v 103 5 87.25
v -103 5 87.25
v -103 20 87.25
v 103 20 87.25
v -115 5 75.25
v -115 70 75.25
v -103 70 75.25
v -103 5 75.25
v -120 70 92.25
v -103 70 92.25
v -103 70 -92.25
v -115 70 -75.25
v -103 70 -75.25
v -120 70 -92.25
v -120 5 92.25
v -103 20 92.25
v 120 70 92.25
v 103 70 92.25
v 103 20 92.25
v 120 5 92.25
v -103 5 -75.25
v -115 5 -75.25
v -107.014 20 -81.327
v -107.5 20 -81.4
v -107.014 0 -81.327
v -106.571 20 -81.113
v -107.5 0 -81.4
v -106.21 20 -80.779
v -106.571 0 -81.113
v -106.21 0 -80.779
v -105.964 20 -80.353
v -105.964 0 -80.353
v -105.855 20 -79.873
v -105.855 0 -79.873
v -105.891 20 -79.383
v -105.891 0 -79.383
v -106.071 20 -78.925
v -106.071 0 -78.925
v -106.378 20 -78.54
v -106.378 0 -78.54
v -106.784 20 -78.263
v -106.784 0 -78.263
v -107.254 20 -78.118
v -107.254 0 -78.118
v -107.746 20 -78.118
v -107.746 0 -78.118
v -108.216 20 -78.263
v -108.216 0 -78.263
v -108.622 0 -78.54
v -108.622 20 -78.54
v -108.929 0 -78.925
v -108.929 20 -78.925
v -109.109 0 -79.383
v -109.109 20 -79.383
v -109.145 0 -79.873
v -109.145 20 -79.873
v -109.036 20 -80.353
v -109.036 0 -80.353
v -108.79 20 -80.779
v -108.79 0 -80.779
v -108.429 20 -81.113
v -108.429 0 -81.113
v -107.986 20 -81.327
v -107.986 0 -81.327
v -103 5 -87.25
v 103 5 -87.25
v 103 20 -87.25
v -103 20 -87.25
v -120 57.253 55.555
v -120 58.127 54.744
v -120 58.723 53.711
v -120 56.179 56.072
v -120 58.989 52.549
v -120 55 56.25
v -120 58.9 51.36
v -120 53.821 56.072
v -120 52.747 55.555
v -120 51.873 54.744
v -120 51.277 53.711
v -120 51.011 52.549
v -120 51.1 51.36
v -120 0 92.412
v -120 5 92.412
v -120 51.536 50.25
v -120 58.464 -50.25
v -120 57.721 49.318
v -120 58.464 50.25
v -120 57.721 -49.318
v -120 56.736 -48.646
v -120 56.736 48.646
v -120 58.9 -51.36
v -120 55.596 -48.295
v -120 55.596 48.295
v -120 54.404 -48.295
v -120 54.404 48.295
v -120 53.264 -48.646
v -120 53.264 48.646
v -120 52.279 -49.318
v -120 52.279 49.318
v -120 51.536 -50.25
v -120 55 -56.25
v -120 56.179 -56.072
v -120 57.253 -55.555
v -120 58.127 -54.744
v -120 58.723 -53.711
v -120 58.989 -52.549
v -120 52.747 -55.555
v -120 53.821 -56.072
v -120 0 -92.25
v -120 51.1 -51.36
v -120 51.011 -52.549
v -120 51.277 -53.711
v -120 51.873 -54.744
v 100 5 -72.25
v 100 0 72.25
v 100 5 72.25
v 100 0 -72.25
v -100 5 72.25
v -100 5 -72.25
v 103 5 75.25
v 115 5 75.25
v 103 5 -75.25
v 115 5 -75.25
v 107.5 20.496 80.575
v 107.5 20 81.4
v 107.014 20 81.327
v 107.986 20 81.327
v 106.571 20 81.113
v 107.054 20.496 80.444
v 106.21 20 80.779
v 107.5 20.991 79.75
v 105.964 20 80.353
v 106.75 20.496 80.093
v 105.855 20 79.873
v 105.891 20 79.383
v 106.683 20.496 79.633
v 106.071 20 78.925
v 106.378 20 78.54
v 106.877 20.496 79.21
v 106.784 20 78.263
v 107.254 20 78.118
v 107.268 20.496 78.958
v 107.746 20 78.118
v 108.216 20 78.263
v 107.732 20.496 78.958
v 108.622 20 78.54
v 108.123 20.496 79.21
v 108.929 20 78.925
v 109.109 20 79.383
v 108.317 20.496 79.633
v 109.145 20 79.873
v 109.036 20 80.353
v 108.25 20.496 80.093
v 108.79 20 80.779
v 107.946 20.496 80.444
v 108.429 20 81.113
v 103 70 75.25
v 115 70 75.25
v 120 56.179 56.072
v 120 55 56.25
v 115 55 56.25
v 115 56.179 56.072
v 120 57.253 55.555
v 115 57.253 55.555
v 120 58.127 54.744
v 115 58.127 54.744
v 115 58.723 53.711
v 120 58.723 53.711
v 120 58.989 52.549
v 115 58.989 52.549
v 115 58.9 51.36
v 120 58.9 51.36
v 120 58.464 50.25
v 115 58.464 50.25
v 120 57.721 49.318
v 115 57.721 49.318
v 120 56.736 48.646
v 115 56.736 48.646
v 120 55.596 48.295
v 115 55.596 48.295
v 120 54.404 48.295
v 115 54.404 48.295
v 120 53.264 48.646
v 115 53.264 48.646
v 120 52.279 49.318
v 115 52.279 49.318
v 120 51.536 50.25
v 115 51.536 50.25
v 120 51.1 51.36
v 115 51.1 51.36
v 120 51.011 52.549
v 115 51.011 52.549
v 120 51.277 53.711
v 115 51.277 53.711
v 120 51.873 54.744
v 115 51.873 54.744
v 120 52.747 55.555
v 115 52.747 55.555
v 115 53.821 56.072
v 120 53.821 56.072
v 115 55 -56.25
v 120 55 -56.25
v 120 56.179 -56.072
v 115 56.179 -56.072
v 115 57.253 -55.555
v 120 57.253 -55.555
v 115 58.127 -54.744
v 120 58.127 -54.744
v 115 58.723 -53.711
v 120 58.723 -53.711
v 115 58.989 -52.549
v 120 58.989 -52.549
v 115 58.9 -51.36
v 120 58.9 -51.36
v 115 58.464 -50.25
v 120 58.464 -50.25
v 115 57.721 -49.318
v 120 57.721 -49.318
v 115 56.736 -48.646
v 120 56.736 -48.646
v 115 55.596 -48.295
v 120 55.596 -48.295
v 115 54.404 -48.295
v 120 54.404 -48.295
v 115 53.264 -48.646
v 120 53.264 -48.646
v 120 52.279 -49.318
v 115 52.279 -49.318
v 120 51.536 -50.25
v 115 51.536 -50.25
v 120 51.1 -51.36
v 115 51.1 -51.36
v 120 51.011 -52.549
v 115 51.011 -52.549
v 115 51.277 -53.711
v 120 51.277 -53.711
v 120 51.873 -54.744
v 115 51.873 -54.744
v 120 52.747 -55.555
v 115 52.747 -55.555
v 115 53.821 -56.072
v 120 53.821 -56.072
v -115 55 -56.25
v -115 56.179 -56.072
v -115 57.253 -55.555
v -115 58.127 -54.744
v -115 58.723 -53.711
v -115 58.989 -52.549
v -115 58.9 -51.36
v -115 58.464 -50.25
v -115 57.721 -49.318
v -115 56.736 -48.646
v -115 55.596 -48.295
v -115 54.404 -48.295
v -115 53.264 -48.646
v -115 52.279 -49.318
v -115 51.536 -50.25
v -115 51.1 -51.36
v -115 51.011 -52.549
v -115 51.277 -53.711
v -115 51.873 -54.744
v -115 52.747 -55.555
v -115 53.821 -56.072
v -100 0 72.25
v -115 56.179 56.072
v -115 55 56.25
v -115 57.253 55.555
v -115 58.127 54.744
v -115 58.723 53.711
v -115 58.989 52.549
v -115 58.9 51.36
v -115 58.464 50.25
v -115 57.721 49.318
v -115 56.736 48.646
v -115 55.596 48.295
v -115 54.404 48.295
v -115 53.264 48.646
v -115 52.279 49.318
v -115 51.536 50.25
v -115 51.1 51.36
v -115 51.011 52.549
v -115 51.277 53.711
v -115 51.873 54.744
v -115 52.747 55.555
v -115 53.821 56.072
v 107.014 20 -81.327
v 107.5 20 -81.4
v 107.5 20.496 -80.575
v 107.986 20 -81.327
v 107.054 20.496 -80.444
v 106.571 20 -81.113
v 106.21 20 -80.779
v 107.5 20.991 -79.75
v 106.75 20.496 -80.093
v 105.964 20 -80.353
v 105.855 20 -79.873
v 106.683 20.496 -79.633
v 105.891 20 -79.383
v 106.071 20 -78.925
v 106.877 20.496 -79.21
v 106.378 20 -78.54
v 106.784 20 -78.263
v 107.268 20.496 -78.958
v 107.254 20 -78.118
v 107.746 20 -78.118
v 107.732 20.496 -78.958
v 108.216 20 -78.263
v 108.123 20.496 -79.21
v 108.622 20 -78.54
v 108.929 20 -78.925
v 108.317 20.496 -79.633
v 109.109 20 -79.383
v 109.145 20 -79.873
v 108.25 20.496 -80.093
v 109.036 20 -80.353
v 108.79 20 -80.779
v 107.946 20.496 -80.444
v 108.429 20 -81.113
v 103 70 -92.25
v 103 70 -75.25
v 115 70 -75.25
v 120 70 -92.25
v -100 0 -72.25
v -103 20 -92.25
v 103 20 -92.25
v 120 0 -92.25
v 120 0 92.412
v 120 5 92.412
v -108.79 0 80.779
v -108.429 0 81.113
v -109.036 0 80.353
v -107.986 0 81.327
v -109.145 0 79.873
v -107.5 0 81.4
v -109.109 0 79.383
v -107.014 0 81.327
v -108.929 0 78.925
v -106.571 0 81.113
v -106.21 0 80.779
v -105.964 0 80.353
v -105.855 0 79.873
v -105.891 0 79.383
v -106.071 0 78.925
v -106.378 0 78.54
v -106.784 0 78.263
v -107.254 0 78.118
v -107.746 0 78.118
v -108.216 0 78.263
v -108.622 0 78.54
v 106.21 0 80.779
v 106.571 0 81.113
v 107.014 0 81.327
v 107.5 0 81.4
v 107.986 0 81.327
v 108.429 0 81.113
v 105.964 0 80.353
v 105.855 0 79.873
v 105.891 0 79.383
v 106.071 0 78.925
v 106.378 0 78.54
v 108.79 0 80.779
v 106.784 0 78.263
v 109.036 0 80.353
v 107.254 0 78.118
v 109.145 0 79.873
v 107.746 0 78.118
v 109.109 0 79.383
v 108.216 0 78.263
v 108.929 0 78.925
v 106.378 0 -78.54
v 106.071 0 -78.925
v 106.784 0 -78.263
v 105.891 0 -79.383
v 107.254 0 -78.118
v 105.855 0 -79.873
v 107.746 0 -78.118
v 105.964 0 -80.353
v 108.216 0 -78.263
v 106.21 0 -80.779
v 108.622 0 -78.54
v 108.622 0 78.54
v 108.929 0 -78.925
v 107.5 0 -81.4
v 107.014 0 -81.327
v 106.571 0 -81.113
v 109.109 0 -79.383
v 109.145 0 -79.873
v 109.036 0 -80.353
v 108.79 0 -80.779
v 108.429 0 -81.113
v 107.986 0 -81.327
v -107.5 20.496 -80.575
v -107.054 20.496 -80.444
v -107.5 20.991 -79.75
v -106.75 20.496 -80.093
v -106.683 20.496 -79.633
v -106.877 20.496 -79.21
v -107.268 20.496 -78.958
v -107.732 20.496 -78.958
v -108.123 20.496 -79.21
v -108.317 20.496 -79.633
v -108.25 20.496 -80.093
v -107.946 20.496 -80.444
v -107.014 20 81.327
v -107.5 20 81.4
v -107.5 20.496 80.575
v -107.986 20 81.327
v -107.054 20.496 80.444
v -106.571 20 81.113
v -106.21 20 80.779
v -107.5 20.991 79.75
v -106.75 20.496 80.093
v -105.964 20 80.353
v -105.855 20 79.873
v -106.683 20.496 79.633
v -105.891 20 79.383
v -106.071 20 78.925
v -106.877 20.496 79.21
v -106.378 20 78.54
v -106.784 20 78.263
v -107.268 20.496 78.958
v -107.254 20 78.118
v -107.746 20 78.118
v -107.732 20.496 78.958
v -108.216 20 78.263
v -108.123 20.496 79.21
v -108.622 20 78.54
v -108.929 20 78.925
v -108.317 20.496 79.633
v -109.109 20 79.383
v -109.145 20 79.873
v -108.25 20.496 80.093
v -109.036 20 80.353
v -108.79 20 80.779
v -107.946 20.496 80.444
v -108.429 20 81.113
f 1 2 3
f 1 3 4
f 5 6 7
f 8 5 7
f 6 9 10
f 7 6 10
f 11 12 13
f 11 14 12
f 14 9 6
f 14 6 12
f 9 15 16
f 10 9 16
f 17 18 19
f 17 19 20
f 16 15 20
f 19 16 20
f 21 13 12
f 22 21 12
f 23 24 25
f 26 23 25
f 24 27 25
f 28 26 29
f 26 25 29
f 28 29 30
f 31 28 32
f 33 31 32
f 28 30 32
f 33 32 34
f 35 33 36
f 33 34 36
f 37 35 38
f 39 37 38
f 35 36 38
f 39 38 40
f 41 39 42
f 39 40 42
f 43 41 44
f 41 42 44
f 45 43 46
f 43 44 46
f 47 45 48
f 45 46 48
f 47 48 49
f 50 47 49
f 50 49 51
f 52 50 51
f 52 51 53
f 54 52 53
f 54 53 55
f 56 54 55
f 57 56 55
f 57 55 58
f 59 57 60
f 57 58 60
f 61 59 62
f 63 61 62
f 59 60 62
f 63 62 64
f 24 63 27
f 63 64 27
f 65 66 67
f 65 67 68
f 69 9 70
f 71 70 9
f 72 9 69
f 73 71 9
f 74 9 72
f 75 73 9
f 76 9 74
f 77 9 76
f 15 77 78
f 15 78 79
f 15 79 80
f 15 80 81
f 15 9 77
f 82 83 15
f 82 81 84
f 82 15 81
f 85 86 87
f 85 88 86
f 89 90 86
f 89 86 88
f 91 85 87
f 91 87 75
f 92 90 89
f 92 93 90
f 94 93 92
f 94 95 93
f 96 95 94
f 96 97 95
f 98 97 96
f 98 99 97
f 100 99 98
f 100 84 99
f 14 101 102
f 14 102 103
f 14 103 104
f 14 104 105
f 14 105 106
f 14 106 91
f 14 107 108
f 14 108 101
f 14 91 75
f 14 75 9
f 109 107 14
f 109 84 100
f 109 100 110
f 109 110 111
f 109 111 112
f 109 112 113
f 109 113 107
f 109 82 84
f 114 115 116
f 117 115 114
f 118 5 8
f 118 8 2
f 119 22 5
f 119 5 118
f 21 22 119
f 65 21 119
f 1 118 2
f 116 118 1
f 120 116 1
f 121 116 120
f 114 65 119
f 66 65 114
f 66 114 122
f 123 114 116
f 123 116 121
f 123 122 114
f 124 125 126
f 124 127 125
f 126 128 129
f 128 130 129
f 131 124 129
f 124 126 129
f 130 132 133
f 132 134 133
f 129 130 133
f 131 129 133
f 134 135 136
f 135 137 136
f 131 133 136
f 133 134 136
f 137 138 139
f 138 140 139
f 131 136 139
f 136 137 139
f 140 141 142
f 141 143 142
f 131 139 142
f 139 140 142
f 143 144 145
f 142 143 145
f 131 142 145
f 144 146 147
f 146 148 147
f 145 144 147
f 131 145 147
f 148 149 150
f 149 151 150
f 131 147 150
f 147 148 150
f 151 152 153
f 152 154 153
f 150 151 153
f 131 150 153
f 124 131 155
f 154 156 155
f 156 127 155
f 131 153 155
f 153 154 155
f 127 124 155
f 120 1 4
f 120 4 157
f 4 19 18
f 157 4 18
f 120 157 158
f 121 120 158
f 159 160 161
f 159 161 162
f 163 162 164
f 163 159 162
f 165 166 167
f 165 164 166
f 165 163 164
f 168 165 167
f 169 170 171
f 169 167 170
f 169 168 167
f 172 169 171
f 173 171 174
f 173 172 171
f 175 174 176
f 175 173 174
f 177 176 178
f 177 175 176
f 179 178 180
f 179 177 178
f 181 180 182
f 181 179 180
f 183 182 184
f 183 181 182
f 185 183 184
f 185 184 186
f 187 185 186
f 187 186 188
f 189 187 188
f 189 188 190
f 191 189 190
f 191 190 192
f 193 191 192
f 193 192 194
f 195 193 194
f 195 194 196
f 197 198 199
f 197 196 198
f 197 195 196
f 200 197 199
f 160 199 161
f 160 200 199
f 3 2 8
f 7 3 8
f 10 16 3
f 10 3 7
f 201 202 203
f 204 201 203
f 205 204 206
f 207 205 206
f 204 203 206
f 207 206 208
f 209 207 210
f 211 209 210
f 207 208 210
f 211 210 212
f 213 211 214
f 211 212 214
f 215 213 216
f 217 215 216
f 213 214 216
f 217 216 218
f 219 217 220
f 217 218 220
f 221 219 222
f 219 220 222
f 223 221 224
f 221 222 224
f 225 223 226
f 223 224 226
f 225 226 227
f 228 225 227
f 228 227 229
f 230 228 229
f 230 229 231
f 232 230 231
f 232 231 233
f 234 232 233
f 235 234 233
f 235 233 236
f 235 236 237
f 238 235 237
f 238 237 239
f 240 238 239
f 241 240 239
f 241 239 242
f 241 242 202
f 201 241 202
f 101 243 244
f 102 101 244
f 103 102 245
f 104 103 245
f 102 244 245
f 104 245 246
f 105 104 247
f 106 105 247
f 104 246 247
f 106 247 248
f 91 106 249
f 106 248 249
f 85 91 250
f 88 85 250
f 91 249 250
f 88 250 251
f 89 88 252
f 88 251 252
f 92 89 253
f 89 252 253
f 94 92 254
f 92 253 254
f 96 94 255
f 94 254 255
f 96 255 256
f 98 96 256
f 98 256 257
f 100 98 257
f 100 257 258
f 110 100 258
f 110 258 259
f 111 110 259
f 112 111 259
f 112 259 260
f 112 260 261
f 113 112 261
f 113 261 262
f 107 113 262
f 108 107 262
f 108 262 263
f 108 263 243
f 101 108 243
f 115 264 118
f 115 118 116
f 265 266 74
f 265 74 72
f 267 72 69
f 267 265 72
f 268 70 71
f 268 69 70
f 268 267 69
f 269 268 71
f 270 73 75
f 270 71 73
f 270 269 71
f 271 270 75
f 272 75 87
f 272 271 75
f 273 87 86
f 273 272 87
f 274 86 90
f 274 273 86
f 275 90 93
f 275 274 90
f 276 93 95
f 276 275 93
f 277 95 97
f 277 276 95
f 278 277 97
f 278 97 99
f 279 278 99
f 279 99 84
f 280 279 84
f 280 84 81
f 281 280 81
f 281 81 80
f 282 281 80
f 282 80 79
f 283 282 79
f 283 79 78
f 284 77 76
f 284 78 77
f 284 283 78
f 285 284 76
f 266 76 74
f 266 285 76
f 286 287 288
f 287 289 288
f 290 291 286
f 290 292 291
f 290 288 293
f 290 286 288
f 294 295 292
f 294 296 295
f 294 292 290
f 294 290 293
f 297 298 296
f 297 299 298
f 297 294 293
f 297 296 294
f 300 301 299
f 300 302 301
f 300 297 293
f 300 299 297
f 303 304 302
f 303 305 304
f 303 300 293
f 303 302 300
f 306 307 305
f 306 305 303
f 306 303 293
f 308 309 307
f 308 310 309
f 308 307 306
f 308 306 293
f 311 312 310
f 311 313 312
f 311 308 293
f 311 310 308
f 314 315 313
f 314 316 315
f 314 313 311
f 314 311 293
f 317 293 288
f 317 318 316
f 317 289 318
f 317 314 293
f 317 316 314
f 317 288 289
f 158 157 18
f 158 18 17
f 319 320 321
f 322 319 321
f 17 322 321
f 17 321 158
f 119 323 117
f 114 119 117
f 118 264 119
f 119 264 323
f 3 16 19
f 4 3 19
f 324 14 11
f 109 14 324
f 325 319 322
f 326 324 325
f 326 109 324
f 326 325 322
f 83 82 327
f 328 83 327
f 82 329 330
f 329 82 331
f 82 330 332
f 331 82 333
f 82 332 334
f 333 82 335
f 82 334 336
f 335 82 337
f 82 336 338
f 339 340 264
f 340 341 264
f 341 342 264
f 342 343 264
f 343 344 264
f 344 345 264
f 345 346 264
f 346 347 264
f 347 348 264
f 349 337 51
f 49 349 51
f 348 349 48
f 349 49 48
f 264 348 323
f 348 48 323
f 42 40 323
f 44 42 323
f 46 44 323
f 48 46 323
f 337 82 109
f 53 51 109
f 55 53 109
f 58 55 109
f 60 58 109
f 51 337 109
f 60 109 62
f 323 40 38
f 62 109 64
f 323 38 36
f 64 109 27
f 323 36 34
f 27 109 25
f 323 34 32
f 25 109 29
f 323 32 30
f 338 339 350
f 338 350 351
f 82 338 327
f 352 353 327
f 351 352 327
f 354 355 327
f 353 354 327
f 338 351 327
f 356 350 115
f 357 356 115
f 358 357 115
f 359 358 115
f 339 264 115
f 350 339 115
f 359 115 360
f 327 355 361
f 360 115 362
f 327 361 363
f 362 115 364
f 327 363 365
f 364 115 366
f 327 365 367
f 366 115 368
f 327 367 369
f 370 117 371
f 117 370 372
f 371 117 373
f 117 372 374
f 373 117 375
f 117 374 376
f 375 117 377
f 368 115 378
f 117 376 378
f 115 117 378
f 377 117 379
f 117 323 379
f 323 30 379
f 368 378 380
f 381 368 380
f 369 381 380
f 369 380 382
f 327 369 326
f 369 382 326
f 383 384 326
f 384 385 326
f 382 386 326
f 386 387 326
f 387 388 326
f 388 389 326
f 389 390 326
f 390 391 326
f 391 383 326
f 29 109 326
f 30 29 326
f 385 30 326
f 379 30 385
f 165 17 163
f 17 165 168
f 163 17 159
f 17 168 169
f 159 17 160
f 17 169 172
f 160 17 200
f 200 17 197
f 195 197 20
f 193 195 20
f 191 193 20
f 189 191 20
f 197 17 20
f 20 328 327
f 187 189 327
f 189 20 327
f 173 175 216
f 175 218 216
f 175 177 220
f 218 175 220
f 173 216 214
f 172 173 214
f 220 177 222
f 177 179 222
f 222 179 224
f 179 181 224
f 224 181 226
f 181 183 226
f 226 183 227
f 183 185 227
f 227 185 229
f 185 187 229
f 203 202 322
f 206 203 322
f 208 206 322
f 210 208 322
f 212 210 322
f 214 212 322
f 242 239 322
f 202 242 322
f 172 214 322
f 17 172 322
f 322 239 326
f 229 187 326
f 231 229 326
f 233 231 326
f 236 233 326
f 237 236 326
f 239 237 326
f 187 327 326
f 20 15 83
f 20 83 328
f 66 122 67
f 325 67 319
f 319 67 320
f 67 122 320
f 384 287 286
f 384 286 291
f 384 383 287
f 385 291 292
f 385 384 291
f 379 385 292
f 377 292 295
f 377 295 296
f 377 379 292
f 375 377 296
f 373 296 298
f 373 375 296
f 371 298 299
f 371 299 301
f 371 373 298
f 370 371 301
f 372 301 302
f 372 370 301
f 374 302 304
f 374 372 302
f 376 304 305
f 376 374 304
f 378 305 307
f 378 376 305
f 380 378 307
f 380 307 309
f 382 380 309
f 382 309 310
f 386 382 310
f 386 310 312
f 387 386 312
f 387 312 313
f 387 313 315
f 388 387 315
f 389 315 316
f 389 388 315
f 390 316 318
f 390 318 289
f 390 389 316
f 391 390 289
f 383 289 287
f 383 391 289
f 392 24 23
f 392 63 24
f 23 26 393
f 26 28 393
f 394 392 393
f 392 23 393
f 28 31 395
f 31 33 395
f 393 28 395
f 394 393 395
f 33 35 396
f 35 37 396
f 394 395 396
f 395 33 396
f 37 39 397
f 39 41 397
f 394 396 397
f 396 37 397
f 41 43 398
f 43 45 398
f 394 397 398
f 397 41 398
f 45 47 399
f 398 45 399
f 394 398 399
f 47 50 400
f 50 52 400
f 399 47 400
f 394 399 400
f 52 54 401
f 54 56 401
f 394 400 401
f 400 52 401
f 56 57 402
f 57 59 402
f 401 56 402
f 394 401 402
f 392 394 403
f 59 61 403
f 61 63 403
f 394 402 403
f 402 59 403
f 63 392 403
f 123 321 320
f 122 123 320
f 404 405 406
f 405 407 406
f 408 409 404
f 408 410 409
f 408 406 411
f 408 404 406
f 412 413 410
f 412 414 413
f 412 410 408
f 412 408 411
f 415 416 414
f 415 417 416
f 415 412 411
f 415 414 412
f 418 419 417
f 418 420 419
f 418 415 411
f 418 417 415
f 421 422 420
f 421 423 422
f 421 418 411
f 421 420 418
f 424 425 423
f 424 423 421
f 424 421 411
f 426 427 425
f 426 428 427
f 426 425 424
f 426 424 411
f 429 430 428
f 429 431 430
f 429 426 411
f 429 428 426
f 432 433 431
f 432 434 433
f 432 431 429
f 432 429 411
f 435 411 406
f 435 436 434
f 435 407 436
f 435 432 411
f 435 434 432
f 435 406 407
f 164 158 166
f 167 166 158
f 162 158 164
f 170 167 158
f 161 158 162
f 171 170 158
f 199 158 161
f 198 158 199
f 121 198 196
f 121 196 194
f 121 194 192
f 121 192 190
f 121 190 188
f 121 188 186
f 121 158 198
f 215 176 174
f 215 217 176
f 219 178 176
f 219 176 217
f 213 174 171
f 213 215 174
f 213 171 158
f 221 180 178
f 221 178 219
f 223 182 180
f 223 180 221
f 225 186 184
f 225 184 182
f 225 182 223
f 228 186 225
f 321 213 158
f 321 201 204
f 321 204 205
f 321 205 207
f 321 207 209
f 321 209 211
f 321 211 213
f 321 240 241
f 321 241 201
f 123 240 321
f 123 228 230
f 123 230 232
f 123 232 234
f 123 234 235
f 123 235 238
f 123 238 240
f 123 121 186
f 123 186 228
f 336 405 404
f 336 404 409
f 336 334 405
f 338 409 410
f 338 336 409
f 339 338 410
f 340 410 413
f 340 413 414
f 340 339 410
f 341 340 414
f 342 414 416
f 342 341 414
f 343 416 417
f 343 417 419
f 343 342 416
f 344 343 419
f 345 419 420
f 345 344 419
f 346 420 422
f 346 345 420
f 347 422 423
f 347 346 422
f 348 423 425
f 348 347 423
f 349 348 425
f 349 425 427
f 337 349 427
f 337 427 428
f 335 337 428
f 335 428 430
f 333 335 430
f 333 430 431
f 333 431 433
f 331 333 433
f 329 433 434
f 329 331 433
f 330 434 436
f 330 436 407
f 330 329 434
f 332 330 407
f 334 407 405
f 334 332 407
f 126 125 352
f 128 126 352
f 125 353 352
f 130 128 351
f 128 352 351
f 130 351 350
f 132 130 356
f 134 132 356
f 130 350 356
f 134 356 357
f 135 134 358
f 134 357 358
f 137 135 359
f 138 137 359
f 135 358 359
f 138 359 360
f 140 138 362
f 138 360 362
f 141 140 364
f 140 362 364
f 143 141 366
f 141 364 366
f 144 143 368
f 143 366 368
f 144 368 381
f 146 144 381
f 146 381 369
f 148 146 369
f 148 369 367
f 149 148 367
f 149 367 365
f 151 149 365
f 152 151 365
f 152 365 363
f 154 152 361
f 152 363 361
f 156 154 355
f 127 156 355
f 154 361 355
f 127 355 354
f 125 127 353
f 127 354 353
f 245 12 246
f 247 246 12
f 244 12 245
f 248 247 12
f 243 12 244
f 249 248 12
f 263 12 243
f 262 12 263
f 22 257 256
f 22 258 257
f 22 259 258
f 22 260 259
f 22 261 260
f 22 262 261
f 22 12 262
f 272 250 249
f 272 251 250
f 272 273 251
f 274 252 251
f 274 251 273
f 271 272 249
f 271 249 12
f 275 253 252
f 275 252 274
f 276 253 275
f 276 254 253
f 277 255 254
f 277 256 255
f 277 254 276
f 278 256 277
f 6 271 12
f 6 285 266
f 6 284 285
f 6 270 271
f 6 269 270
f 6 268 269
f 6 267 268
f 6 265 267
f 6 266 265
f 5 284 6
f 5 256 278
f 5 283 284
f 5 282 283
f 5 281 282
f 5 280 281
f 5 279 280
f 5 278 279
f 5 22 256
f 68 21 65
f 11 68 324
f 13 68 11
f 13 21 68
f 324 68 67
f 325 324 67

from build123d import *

# Parameters (mm, degrees)
SKIZZE1_W                       = 240
SKIZZE1_H                       = 184.5
AUFSATZ_LINEAR_AUSTRAGEN1_DEPTH = 70
SKIZZE2_W                       = 206
SKIZZE2_H                       = 50
SCHNITT_LINEAR_AUSTRAGEN3_DEPTH = 231.955082213
SKIZZE3_W                       = 240
SKIZZE3_H                       = 184.662178294
SKIZZE3_W_2                     = 200
SKIZZE3_H_2                     = 144.5
AUFSATZ_LINEAR_AUSTRAGEN2_DEPTH = 5
F_8_0MM_STIFTLOCH1_D            = 8


with BuildPart() as part:
    # Skizze1 → Aufsatz-Linear austragen1 (new body)
    with BuildSketch(Plane(origin=(0, 0, 0), x_dir=(1, 0, 0), z_dir=(0, 1, 0))):
        Rectangle(SKIZZE1_W, SKIZZE1_H)
        Polygon((103, 87.25), (-103, 87.25), (-103, 75.25), (-115, 75.25), (-115, -75.25), (-103, -75.25), (-103, -87.25), (103, -87.25), (103, -75.25), (115, -75.25), (115, 75.25), (103, 75.25), align=None, mode=Mode.SUBTRACT)
    extrude(amount=AUFSATZ_LINEAR_AUSTRAGEN1_DEPTH)

    # Skizze2 → Schnitt-Linear austragen3 (cut, through all)
    with BuildSketch(Plane.XY.offset(92.25)):
        with Locations((0, 45)):
            Rectangle(SKIZZE2_W, SKIZZE2_H)
    extrude(amount=-SCHNITT_LINEAR_AUSTRAGEN3_DEPTH, mode=Mode.SUBTRACT)

    # Skizze3 → Aufsatz-Linear austragen2 (add)
    with BuildSketch(Plane(origin=(0, 0, 0), x_dir=(1, 0, 0), z_dir=(0, 1, 0))):
        with Locations((0, -0.081089147)):
            Rectangle(SKIZZE3_W, SKIZZE3_H)
        Rectangle(SKIZZE3_W_2, SKIZZE3_H_2, mode=Mode.SUBTRACT)
    extrude(amount=AUFSATZ_LINEAR_AUSTRAGEN2_DEPTH)

    # Skizze7 → Kernloch für M4x0.71 (revolve, cut)
    with BuildSketch(Plane(origin=(107.5, 0, -79.75), x_dir=(0, 0, -1), z_dir=(1, 0, 0))):
        Polygon((0, 0), (0, 20.991420021), (1.65, 20), (1.65, 0), align=None)
    kernloch_f_r_m4x0_71 = revolve(axis=Axis((107.5, -6.35, -79.75), (0, 1, 0)), mode=Mode.SUBTRACT)

    # Spiegeln1: Kernloch für M4x0.71 across plane
    add(kernloch_f_r_m4x0_71.mirror(Plane.ZY), mode=Mode.SUBTRACT)

    # Spiegeln2: Kernloch für M4x0.71 across plane
    add(kernloch_f_r_m4x0_71.mirror(Plane(origin=(0, 0, 0), x_dir=(1, 0, 0), z_dir=(0, 0, -1))), mode=Mode.SUBTRACT)

    # Spiegeln2 copy 1 sketch → Spiegeln2 copy 1 (revolve, cut)
    with BuildSketch(Plane(origin=(-107.5, 0, 79.75), x_dir=(0, 0, 1), z_dir=(-1, 0, 0))):
        Polygon((0, 0), (0, 20.991420021), (1.65, 20), (1.65, 0), align=None)
    revolve(axis=Axis((-107.5, -6.35, 79.75), (0, 1, 0)), mode=Mode.SUBTRACT)

    # Ø8.0mm Stiftloch1 (through all)
    with Locations(Plane.ZY.offset(120)):
        with Locations((-52.25, 55)):
            f_8_0mm_stiftloch1 = Hole(F_8_0MM_STIFTLOCH1_D / 2)

    # Spiegeln3: Ø8.0mm Stiftloch1 across plane
    add(f_8_0mm_stiftloch1.mirror(Plane(origin=(0, 0, 0), x_dir=(1, 0, 0), z_dir=(0, 0, -1))), mode=Mode.SUBTRACT)


solid = part.part
